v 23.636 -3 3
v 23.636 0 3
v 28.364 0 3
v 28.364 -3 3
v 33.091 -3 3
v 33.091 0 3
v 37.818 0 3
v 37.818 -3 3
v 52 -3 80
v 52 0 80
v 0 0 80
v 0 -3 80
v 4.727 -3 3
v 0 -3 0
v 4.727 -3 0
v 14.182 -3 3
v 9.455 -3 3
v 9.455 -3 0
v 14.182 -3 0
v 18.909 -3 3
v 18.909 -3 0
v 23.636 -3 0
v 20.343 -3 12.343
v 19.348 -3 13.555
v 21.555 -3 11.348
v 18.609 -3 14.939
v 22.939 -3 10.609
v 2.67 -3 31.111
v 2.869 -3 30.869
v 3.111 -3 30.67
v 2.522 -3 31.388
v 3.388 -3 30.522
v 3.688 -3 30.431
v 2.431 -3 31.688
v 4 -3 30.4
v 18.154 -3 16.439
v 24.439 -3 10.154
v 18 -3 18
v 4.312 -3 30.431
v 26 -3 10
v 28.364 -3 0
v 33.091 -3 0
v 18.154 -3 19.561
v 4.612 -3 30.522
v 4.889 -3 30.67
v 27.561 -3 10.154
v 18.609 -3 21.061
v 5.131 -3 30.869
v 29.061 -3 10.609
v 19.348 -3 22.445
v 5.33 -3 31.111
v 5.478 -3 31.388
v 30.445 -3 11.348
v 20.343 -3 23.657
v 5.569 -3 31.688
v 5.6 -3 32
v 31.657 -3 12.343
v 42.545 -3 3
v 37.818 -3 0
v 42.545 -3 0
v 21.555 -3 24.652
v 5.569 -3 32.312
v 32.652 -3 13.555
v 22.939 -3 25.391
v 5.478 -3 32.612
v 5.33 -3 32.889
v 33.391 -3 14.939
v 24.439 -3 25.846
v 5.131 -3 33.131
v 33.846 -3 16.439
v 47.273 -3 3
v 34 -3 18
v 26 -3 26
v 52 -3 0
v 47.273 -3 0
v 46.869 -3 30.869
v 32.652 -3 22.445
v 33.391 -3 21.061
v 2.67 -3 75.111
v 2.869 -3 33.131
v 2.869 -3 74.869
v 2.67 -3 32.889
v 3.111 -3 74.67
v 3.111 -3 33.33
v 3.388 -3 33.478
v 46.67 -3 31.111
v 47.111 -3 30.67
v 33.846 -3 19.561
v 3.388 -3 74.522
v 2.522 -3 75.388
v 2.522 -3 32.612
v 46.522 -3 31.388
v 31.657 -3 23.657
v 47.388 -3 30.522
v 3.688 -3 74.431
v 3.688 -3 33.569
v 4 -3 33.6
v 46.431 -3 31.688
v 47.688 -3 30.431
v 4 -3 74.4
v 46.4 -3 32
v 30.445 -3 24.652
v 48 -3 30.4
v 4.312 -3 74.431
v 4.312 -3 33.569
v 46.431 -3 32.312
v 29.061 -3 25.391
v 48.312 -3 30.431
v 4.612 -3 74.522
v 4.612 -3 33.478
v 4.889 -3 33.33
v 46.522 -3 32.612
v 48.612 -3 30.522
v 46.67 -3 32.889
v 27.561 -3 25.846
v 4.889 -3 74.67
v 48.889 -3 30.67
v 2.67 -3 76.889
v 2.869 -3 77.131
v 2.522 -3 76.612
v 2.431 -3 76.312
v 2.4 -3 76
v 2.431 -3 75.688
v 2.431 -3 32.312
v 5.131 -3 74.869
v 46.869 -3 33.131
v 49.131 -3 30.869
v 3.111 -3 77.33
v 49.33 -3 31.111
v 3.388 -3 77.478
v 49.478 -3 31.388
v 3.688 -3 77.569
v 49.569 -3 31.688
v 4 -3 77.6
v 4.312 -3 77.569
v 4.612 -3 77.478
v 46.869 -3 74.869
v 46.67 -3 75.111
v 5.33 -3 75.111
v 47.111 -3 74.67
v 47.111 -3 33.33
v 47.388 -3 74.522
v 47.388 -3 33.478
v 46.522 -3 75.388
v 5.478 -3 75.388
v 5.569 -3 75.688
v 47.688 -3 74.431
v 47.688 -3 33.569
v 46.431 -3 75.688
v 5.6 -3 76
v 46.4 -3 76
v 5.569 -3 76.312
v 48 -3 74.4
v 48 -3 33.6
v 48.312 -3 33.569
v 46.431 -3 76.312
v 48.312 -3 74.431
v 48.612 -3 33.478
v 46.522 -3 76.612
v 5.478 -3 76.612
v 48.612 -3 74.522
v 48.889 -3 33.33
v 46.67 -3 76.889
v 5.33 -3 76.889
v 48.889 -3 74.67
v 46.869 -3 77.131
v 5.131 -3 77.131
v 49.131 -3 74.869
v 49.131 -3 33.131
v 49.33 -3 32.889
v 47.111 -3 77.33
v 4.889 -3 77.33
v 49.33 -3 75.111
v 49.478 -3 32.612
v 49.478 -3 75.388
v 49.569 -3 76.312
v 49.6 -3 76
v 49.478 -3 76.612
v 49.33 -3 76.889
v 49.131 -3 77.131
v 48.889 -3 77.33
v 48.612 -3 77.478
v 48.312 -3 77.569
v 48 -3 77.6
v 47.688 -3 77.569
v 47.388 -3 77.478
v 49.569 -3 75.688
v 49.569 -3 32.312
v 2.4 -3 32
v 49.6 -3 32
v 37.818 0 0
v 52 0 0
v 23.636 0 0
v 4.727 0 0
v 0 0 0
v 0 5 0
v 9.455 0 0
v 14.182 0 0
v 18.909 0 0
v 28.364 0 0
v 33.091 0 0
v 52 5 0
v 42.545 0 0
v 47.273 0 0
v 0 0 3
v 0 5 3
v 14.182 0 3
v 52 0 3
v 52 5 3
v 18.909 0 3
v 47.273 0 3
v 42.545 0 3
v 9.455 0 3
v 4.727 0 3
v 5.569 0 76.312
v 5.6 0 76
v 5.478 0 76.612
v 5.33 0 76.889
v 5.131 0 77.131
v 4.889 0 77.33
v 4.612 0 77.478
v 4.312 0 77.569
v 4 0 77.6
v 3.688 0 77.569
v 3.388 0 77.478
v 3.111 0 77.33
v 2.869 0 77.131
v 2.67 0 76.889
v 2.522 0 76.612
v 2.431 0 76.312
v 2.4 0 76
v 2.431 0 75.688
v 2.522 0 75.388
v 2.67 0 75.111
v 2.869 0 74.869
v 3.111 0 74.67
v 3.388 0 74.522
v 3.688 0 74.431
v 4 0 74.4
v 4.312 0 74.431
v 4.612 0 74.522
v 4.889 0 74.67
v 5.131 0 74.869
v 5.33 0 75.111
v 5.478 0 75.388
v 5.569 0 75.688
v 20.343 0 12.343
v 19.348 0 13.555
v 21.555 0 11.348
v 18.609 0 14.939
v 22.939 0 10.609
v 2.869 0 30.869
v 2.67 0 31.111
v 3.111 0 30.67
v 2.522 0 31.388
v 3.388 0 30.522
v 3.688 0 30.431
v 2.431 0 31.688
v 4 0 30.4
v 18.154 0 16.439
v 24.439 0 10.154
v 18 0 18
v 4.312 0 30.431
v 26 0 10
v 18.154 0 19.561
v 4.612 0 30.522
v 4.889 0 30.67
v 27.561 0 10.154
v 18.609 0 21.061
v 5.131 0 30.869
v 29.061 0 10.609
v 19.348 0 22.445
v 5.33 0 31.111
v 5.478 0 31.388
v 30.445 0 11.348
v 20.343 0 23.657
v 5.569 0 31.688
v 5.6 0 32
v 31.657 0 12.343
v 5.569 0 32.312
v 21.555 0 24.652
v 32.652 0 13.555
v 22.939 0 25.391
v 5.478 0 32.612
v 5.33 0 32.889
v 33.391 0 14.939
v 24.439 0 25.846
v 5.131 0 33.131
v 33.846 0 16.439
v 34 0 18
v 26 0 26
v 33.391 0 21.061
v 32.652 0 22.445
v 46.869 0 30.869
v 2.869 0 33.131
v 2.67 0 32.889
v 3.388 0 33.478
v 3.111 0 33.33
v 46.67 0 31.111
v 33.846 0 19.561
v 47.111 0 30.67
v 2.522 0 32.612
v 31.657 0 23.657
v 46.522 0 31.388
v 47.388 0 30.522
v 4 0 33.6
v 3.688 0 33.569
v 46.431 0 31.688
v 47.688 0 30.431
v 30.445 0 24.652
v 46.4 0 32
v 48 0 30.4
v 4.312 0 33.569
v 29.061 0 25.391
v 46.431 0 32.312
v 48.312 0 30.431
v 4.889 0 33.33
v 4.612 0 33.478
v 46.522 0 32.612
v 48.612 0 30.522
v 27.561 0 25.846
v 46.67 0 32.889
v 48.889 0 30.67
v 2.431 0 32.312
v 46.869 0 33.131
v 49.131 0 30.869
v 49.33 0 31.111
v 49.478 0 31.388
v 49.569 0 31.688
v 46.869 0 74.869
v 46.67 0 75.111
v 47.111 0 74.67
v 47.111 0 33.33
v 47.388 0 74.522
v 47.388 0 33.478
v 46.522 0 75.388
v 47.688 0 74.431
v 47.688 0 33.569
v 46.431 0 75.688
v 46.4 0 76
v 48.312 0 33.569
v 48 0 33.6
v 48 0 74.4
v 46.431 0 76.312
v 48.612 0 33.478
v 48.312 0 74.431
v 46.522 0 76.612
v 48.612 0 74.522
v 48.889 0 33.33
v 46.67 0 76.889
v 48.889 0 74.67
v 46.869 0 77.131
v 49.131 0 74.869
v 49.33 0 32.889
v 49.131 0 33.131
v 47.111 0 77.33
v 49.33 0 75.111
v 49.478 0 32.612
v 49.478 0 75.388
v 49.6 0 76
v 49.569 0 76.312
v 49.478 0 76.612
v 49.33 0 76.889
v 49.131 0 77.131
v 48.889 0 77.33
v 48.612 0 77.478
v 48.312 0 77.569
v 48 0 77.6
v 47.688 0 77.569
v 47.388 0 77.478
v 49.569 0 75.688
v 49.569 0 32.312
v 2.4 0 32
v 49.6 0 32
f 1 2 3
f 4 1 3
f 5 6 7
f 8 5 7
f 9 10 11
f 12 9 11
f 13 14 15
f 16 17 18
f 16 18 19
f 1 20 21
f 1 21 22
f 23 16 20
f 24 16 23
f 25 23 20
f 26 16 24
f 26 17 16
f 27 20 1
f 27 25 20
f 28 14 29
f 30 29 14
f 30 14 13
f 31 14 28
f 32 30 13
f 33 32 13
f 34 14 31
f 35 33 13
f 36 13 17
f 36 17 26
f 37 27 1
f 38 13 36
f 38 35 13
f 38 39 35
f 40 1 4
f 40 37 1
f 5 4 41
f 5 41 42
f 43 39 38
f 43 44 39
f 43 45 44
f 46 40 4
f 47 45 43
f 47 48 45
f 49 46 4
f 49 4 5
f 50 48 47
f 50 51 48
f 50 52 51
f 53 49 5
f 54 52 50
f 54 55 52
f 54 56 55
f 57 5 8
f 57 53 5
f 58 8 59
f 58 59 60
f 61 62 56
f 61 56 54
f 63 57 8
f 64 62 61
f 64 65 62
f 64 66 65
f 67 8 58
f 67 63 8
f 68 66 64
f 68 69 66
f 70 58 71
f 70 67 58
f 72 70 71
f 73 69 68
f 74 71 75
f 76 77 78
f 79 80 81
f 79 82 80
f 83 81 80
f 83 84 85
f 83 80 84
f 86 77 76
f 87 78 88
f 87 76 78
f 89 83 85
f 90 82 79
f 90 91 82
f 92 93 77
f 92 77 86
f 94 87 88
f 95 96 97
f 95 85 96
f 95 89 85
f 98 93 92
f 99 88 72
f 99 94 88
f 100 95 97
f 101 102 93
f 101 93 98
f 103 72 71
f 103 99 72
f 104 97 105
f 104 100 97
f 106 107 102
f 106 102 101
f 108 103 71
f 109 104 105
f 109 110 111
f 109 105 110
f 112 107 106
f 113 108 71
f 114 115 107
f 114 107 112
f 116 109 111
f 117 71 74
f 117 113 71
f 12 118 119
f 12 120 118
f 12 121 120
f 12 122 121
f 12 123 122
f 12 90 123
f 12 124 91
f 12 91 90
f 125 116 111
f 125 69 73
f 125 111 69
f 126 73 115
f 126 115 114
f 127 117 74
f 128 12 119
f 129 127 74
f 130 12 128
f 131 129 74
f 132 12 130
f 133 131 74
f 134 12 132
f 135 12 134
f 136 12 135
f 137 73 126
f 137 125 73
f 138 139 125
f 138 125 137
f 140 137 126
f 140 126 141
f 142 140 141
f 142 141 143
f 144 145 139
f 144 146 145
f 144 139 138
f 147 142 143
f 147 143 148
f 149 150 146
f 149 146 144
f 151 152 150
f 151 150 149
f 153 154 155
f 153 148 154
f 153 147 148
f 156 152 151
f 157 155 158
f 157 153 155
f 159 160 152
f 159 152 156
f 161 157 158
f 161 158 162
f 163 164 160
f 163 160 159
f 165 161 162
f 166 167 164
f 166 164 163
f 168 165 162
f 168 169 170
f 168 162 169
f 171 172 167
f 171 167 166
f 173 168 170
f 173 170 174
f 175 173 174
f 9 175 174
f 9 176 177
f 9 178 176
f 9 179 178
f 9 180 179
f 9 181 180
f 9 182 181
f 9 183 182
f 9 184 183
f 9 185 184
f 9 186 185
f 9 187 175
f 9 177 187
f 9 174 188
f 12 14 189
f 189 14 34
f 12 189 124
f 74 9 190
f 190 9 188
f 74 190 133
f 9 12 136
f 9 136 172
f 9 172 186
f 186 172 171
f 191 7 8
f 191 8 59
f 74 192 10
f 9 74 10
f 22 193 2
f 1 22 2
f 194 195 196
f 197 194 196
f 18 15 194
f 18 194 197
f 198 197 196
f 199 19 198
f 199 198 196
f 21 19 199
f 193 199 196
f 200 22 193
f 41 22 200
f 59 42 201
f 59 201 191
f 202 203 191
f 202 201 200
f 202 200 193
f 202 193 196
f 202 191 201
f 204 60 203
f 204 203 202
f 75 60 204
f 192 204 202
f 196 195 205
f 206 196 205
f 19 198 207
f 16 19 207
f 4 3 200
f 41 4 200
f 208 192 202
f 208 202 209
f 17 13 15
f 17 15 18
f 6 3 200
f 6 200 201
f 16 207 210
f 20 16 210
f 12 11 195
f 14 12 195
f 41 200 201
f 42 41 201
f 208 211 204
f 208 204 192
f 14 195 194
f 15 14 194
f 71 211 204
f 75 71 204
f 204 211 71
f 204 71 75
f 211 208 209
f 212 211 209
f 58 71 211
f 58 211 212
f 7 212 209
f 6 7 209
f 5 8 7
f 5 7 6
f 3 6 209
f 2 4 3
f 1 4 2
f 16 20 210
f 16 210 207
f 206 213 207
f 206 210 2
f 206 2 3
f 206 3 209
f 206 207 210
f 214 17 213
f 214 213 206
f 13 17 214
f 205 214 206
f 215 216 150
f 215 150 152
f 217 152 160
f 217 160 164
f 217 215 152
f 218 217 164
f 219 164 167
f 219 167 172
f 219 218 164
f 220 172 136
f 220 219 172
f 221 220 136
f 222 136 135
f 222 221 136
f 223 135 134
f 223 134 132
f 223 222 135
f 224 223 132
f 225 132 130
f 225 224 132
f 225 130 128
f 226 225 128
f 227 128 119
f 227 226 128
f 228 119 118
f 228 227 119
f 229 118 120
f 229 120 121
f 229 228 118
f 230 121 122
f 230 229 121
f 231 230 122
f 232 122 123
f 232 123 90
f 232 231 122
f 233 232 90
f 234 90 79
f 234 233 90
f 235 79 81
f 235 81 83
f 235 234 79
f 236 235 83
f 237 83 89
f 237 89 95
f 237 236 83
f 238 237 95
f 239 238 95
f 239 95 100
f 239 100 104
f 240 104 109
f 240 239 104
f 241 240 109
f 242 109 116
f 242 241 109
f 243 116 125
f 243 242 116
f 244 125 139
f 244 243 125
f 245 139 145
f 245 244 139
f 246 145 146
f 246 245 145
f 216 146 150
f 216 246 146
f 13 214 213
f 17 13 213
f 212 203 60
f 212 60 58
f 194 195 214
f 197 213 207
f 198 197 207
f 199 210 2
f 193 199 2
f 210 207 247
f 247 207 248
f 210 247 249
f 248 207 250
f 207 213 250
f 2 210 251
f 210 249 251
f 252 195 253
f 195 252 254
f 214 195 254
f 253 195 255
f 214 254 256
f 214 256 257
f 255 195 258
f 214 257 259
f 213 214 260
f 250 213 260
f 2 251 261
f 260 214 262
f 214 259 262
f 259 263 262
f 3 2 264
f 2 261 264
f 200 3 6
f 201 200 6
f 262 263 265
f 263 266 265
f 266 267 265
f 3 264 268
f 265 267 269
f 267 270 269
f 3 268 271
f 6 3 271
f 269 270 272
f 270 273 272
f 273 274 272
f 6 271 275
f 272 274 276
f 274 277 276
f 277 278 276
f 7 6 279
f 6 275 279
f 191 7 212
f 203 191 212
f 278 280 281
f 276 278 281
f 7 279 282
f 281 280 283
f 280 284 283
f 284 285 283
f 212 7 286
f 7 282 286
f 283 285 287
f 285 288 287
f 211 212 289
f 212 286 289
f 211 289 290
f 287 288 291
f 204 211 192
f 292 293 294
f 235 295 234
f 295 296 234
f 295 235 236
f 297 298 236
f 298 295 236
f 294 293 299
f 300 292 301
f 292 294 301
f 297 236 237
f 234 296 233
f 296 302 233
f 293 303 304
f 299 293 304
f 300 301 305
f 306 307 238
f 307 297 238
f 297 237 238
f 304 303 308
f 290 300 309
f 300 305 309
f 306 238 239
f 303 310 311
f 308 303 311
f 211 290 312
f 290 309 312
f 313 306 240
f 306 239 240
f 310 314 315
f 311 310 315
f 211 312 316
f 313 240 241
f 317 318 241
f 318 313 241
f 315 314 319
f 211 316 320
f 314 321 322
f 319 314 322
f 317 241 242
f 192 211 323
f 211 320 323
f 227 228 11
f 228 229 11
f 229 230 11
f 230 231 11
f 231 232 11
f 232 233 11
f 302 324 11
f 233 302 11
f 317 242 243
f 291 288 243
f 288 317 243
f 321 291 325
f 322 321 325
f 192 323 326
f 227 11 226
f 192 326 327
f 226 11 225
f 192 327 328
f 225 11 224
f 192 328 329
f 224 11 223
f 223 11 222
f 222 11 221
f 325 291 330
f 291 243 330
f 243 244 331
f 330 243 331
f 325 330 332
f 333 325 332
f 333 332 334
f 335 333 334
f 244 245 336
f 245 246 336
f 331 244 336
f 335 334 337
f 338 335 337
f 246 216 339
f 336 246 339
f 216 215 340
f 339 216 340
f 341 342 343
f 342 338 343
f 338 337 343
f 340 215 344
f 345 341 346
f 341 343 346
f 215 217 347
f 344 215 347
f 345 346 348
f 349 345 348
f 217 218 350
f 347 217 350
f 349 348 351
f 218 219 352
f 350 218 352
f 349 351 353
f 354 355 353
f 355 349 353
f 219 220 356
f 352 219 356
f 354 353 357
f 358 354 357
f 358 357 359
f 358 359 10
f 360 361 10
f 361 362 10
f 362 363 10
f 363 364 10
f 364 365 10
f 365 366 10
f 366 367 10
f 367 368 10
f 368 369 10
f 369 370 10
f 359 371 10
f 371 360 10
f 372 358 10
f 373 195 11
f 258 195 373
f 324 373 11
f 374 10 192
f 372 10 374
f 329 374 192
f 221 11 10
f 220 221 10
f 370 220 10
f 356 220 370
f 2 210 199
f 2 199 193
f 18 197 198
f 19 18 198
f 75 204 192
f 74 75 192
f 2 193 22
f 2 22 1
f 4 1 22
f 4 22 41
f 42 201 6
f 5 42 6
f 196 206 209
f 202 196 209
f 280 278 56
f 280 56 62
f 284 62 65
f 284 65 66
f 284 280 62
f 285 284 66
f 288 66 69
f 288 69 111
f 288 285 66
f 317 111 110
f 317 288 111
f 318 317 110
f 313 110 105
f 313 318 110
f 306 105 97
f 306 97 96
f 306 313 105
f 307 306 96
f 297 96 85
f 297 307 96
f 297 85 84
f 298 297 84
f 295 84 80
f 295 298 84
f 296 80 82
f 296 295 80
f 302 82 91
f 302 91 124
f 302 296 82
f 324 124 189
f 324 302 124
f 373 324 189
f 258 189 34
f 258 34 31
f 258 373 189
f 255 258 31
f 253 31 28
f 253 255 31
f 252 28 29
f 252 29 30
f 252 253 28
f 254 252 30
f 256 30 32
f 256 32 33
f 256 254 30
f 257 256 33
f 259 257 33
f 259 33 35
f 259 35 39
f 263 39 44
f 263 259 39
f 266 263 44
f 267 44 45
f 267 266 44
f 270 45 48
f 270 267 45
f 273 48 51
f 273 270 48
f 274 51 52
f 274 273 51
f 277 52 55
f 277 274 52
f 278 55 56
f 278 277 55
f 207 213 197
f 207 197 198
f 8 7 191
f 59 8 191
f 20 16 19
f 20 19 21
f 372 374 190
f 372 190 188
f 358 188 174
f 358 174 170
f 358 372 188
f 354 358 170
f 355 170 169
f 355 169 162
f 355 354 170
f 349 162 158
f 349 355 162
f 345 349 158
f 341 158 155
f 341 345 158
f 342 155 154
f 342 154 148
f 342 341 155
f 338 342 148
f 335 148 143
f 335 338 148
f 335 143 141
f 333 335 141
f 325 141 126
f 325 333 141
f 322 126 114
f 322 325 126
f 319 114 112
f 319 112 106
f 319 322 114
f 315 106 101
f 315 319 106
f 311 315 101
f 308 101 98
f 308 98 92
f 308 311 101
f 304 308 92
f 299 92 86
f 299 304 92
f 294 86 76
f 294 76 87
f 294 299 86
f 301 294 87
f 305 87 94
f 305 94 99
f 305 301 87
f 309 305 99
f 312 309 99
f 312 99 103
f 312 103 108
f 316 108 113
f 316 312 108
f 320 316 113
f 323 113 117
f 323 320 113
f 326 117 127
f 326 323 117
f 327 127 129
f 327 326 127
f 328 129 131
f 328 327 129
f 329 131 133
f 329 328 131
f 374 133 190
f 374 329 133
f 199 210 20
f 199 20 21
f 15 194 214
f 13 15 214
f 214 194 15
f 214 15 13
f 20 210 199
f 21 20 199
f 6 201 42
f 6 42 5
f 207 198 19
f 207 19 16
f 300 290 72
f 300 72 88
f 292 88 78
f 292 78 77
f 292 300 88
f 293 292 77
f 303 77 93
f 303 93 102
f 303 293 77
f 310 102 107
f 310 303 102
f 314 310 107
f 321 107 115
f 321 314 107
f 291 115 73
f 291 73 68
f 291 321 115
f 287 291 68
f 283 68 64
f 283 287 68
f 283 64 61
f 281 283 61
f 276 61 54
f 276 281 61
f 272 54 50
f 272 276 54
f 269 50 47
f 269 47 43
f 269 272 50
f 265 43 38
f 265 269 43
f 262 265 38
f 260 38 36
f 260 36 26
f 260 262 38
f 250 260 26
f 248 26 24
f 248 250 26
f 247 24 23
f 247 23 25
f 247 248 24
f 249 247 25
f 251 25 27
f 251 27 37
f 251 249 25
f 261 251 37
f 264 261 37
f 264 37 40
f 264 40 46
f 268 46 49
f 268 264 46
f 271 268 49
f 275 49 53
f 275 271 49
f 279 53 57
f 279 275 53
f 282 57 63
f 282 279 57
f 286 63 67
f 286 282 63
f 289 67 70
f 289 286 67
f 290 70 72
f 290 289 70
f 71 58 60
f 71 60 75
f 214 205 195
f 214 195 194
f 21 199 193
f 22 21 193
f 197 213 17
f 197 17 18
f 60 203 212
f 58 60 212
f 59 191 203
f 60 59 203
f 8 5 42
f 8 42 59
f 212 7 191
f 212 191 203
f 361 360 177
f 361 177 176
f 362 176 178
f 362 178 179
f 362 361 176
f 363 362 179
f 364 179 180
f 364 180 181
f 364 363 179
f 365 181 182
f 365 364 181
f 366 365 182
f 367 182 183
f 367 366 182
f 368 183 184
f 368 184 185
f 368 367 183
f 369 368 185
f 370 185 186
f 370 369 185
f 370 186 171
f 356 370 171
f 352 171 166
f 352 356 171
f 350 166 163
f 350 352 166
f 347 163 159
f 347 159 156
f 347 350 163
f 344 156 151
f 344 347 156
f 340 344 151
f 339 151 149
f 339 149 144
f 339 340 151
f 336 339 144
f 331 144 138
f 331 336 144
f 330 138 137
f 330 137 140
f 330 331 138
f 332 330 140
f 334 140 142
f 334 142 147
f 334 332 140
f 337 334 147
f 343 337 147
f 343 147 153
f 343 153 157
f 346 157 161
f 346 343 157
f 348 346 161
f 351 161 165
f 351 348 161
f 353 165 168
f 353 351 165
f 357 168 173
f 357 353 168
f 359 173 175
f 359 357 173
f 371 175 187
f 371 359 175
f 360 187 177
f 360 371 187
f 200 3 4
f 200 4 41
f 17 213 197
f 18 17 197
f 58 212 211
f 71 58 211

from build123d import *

# Parameters (mm, degrees)
F0_R     = 1.6
F0_R_2   = 8
F1_DEPTH = 3
F2_W     = 4.7272727273
F2_H     = 3
F3_DEPTH = 8


# Not quite as in the source:
# - a feature names something its author has since deleted; it is built from what else it names


with BuildPart() as f1:
    # F0 (on Front) → F1 (new body)
    with BuildSketch(Plane.XZ):
        Polygon((0, 80), (0, 0), (4.7272727273, 0), (4.7272727273, 3), (9.4545454545, 3), (9.4545454545, 0), (14.1818181818, 0), (14.1818181818, 3), (18.9090909091, 3), (18.9090909091, 0), (23.6363636364, 0), (23.6363636364, 3), (28.3636363636, 3), (28.3636363636, 0), (33.0909090909, 0), (33.0909090909, 3), (37.8181818182, 3), (37.8181818182, 0), (42.5454545455, 0), (42.5454545455, 3), (47.2727272727, 3), (47.2727272727, 0), (52, 0), (52, 80), align=None)
        with Locations((4, 32)):
            Circle(F0_R, mode=Mode.SUBTRACT)
        with Locations((26, 18)):
            Circle(F0_R_2, mode=Mode.SUBTRACT)
        with Locations((48, 32)):
            Circle(F0_R, mode=Mode.SUBTRACT)
        with Locations((4, 76)):
            Circle(F0_R, mode=Mode.SUBTRACT)
        with Locations((48, 76)):
            Circle(F0_R, mode=Mode.SUBTRACT)
    extrude(amount=F1_DEPTH)


with BuildPart() as f3:
    # F2 (on face) → F3 (new body)
    with BuildSketch(Plane.XZ.offset(3)):
        with Locations((2.3636363636, 1.5)):
            Rectangle(F2_W, F2_H)
        with Locations((7.0909090909, 1.5)):
            Rectangle(F2_W, F2_H)
        with Locations((11.8181818182, 1.5)):
            Rectangle(F2_W, F2_H)
        with Locations((16.5454545455, 1.5)):
            Rectangle(F2_W, F2_H)
        with Locations((21.2727272727, 1.5)):
            Rectangle(F2_W, F2_H)
        with Locations((26, 1.5)):
            Rectangle(F2_W, F2_H)
        with Locations((30.7272727273, 1.5)):
            Rectangle(F2_W, F2_H)
        with Locations((35.4545454545, 1.5)):
            Rectangle(F2_W, F2_H)
        with Locations((40.1818181818, 1.5)):
            Rectangle(F2_W, F2_H)
        with Locations((44.9090909091, 1.5)):
            Rectangle(F2_W, F2_H)
        with Locations((49.6363636364, 1.5)):
            Rectangle(F2_W, F2_H)
    extrude(amount=-F3_DEPTH)

    # F4: cut F1
    add(f1.part, mode=Mode.SUBTRACT)


solid = Compound([f1.part, f3.part])
